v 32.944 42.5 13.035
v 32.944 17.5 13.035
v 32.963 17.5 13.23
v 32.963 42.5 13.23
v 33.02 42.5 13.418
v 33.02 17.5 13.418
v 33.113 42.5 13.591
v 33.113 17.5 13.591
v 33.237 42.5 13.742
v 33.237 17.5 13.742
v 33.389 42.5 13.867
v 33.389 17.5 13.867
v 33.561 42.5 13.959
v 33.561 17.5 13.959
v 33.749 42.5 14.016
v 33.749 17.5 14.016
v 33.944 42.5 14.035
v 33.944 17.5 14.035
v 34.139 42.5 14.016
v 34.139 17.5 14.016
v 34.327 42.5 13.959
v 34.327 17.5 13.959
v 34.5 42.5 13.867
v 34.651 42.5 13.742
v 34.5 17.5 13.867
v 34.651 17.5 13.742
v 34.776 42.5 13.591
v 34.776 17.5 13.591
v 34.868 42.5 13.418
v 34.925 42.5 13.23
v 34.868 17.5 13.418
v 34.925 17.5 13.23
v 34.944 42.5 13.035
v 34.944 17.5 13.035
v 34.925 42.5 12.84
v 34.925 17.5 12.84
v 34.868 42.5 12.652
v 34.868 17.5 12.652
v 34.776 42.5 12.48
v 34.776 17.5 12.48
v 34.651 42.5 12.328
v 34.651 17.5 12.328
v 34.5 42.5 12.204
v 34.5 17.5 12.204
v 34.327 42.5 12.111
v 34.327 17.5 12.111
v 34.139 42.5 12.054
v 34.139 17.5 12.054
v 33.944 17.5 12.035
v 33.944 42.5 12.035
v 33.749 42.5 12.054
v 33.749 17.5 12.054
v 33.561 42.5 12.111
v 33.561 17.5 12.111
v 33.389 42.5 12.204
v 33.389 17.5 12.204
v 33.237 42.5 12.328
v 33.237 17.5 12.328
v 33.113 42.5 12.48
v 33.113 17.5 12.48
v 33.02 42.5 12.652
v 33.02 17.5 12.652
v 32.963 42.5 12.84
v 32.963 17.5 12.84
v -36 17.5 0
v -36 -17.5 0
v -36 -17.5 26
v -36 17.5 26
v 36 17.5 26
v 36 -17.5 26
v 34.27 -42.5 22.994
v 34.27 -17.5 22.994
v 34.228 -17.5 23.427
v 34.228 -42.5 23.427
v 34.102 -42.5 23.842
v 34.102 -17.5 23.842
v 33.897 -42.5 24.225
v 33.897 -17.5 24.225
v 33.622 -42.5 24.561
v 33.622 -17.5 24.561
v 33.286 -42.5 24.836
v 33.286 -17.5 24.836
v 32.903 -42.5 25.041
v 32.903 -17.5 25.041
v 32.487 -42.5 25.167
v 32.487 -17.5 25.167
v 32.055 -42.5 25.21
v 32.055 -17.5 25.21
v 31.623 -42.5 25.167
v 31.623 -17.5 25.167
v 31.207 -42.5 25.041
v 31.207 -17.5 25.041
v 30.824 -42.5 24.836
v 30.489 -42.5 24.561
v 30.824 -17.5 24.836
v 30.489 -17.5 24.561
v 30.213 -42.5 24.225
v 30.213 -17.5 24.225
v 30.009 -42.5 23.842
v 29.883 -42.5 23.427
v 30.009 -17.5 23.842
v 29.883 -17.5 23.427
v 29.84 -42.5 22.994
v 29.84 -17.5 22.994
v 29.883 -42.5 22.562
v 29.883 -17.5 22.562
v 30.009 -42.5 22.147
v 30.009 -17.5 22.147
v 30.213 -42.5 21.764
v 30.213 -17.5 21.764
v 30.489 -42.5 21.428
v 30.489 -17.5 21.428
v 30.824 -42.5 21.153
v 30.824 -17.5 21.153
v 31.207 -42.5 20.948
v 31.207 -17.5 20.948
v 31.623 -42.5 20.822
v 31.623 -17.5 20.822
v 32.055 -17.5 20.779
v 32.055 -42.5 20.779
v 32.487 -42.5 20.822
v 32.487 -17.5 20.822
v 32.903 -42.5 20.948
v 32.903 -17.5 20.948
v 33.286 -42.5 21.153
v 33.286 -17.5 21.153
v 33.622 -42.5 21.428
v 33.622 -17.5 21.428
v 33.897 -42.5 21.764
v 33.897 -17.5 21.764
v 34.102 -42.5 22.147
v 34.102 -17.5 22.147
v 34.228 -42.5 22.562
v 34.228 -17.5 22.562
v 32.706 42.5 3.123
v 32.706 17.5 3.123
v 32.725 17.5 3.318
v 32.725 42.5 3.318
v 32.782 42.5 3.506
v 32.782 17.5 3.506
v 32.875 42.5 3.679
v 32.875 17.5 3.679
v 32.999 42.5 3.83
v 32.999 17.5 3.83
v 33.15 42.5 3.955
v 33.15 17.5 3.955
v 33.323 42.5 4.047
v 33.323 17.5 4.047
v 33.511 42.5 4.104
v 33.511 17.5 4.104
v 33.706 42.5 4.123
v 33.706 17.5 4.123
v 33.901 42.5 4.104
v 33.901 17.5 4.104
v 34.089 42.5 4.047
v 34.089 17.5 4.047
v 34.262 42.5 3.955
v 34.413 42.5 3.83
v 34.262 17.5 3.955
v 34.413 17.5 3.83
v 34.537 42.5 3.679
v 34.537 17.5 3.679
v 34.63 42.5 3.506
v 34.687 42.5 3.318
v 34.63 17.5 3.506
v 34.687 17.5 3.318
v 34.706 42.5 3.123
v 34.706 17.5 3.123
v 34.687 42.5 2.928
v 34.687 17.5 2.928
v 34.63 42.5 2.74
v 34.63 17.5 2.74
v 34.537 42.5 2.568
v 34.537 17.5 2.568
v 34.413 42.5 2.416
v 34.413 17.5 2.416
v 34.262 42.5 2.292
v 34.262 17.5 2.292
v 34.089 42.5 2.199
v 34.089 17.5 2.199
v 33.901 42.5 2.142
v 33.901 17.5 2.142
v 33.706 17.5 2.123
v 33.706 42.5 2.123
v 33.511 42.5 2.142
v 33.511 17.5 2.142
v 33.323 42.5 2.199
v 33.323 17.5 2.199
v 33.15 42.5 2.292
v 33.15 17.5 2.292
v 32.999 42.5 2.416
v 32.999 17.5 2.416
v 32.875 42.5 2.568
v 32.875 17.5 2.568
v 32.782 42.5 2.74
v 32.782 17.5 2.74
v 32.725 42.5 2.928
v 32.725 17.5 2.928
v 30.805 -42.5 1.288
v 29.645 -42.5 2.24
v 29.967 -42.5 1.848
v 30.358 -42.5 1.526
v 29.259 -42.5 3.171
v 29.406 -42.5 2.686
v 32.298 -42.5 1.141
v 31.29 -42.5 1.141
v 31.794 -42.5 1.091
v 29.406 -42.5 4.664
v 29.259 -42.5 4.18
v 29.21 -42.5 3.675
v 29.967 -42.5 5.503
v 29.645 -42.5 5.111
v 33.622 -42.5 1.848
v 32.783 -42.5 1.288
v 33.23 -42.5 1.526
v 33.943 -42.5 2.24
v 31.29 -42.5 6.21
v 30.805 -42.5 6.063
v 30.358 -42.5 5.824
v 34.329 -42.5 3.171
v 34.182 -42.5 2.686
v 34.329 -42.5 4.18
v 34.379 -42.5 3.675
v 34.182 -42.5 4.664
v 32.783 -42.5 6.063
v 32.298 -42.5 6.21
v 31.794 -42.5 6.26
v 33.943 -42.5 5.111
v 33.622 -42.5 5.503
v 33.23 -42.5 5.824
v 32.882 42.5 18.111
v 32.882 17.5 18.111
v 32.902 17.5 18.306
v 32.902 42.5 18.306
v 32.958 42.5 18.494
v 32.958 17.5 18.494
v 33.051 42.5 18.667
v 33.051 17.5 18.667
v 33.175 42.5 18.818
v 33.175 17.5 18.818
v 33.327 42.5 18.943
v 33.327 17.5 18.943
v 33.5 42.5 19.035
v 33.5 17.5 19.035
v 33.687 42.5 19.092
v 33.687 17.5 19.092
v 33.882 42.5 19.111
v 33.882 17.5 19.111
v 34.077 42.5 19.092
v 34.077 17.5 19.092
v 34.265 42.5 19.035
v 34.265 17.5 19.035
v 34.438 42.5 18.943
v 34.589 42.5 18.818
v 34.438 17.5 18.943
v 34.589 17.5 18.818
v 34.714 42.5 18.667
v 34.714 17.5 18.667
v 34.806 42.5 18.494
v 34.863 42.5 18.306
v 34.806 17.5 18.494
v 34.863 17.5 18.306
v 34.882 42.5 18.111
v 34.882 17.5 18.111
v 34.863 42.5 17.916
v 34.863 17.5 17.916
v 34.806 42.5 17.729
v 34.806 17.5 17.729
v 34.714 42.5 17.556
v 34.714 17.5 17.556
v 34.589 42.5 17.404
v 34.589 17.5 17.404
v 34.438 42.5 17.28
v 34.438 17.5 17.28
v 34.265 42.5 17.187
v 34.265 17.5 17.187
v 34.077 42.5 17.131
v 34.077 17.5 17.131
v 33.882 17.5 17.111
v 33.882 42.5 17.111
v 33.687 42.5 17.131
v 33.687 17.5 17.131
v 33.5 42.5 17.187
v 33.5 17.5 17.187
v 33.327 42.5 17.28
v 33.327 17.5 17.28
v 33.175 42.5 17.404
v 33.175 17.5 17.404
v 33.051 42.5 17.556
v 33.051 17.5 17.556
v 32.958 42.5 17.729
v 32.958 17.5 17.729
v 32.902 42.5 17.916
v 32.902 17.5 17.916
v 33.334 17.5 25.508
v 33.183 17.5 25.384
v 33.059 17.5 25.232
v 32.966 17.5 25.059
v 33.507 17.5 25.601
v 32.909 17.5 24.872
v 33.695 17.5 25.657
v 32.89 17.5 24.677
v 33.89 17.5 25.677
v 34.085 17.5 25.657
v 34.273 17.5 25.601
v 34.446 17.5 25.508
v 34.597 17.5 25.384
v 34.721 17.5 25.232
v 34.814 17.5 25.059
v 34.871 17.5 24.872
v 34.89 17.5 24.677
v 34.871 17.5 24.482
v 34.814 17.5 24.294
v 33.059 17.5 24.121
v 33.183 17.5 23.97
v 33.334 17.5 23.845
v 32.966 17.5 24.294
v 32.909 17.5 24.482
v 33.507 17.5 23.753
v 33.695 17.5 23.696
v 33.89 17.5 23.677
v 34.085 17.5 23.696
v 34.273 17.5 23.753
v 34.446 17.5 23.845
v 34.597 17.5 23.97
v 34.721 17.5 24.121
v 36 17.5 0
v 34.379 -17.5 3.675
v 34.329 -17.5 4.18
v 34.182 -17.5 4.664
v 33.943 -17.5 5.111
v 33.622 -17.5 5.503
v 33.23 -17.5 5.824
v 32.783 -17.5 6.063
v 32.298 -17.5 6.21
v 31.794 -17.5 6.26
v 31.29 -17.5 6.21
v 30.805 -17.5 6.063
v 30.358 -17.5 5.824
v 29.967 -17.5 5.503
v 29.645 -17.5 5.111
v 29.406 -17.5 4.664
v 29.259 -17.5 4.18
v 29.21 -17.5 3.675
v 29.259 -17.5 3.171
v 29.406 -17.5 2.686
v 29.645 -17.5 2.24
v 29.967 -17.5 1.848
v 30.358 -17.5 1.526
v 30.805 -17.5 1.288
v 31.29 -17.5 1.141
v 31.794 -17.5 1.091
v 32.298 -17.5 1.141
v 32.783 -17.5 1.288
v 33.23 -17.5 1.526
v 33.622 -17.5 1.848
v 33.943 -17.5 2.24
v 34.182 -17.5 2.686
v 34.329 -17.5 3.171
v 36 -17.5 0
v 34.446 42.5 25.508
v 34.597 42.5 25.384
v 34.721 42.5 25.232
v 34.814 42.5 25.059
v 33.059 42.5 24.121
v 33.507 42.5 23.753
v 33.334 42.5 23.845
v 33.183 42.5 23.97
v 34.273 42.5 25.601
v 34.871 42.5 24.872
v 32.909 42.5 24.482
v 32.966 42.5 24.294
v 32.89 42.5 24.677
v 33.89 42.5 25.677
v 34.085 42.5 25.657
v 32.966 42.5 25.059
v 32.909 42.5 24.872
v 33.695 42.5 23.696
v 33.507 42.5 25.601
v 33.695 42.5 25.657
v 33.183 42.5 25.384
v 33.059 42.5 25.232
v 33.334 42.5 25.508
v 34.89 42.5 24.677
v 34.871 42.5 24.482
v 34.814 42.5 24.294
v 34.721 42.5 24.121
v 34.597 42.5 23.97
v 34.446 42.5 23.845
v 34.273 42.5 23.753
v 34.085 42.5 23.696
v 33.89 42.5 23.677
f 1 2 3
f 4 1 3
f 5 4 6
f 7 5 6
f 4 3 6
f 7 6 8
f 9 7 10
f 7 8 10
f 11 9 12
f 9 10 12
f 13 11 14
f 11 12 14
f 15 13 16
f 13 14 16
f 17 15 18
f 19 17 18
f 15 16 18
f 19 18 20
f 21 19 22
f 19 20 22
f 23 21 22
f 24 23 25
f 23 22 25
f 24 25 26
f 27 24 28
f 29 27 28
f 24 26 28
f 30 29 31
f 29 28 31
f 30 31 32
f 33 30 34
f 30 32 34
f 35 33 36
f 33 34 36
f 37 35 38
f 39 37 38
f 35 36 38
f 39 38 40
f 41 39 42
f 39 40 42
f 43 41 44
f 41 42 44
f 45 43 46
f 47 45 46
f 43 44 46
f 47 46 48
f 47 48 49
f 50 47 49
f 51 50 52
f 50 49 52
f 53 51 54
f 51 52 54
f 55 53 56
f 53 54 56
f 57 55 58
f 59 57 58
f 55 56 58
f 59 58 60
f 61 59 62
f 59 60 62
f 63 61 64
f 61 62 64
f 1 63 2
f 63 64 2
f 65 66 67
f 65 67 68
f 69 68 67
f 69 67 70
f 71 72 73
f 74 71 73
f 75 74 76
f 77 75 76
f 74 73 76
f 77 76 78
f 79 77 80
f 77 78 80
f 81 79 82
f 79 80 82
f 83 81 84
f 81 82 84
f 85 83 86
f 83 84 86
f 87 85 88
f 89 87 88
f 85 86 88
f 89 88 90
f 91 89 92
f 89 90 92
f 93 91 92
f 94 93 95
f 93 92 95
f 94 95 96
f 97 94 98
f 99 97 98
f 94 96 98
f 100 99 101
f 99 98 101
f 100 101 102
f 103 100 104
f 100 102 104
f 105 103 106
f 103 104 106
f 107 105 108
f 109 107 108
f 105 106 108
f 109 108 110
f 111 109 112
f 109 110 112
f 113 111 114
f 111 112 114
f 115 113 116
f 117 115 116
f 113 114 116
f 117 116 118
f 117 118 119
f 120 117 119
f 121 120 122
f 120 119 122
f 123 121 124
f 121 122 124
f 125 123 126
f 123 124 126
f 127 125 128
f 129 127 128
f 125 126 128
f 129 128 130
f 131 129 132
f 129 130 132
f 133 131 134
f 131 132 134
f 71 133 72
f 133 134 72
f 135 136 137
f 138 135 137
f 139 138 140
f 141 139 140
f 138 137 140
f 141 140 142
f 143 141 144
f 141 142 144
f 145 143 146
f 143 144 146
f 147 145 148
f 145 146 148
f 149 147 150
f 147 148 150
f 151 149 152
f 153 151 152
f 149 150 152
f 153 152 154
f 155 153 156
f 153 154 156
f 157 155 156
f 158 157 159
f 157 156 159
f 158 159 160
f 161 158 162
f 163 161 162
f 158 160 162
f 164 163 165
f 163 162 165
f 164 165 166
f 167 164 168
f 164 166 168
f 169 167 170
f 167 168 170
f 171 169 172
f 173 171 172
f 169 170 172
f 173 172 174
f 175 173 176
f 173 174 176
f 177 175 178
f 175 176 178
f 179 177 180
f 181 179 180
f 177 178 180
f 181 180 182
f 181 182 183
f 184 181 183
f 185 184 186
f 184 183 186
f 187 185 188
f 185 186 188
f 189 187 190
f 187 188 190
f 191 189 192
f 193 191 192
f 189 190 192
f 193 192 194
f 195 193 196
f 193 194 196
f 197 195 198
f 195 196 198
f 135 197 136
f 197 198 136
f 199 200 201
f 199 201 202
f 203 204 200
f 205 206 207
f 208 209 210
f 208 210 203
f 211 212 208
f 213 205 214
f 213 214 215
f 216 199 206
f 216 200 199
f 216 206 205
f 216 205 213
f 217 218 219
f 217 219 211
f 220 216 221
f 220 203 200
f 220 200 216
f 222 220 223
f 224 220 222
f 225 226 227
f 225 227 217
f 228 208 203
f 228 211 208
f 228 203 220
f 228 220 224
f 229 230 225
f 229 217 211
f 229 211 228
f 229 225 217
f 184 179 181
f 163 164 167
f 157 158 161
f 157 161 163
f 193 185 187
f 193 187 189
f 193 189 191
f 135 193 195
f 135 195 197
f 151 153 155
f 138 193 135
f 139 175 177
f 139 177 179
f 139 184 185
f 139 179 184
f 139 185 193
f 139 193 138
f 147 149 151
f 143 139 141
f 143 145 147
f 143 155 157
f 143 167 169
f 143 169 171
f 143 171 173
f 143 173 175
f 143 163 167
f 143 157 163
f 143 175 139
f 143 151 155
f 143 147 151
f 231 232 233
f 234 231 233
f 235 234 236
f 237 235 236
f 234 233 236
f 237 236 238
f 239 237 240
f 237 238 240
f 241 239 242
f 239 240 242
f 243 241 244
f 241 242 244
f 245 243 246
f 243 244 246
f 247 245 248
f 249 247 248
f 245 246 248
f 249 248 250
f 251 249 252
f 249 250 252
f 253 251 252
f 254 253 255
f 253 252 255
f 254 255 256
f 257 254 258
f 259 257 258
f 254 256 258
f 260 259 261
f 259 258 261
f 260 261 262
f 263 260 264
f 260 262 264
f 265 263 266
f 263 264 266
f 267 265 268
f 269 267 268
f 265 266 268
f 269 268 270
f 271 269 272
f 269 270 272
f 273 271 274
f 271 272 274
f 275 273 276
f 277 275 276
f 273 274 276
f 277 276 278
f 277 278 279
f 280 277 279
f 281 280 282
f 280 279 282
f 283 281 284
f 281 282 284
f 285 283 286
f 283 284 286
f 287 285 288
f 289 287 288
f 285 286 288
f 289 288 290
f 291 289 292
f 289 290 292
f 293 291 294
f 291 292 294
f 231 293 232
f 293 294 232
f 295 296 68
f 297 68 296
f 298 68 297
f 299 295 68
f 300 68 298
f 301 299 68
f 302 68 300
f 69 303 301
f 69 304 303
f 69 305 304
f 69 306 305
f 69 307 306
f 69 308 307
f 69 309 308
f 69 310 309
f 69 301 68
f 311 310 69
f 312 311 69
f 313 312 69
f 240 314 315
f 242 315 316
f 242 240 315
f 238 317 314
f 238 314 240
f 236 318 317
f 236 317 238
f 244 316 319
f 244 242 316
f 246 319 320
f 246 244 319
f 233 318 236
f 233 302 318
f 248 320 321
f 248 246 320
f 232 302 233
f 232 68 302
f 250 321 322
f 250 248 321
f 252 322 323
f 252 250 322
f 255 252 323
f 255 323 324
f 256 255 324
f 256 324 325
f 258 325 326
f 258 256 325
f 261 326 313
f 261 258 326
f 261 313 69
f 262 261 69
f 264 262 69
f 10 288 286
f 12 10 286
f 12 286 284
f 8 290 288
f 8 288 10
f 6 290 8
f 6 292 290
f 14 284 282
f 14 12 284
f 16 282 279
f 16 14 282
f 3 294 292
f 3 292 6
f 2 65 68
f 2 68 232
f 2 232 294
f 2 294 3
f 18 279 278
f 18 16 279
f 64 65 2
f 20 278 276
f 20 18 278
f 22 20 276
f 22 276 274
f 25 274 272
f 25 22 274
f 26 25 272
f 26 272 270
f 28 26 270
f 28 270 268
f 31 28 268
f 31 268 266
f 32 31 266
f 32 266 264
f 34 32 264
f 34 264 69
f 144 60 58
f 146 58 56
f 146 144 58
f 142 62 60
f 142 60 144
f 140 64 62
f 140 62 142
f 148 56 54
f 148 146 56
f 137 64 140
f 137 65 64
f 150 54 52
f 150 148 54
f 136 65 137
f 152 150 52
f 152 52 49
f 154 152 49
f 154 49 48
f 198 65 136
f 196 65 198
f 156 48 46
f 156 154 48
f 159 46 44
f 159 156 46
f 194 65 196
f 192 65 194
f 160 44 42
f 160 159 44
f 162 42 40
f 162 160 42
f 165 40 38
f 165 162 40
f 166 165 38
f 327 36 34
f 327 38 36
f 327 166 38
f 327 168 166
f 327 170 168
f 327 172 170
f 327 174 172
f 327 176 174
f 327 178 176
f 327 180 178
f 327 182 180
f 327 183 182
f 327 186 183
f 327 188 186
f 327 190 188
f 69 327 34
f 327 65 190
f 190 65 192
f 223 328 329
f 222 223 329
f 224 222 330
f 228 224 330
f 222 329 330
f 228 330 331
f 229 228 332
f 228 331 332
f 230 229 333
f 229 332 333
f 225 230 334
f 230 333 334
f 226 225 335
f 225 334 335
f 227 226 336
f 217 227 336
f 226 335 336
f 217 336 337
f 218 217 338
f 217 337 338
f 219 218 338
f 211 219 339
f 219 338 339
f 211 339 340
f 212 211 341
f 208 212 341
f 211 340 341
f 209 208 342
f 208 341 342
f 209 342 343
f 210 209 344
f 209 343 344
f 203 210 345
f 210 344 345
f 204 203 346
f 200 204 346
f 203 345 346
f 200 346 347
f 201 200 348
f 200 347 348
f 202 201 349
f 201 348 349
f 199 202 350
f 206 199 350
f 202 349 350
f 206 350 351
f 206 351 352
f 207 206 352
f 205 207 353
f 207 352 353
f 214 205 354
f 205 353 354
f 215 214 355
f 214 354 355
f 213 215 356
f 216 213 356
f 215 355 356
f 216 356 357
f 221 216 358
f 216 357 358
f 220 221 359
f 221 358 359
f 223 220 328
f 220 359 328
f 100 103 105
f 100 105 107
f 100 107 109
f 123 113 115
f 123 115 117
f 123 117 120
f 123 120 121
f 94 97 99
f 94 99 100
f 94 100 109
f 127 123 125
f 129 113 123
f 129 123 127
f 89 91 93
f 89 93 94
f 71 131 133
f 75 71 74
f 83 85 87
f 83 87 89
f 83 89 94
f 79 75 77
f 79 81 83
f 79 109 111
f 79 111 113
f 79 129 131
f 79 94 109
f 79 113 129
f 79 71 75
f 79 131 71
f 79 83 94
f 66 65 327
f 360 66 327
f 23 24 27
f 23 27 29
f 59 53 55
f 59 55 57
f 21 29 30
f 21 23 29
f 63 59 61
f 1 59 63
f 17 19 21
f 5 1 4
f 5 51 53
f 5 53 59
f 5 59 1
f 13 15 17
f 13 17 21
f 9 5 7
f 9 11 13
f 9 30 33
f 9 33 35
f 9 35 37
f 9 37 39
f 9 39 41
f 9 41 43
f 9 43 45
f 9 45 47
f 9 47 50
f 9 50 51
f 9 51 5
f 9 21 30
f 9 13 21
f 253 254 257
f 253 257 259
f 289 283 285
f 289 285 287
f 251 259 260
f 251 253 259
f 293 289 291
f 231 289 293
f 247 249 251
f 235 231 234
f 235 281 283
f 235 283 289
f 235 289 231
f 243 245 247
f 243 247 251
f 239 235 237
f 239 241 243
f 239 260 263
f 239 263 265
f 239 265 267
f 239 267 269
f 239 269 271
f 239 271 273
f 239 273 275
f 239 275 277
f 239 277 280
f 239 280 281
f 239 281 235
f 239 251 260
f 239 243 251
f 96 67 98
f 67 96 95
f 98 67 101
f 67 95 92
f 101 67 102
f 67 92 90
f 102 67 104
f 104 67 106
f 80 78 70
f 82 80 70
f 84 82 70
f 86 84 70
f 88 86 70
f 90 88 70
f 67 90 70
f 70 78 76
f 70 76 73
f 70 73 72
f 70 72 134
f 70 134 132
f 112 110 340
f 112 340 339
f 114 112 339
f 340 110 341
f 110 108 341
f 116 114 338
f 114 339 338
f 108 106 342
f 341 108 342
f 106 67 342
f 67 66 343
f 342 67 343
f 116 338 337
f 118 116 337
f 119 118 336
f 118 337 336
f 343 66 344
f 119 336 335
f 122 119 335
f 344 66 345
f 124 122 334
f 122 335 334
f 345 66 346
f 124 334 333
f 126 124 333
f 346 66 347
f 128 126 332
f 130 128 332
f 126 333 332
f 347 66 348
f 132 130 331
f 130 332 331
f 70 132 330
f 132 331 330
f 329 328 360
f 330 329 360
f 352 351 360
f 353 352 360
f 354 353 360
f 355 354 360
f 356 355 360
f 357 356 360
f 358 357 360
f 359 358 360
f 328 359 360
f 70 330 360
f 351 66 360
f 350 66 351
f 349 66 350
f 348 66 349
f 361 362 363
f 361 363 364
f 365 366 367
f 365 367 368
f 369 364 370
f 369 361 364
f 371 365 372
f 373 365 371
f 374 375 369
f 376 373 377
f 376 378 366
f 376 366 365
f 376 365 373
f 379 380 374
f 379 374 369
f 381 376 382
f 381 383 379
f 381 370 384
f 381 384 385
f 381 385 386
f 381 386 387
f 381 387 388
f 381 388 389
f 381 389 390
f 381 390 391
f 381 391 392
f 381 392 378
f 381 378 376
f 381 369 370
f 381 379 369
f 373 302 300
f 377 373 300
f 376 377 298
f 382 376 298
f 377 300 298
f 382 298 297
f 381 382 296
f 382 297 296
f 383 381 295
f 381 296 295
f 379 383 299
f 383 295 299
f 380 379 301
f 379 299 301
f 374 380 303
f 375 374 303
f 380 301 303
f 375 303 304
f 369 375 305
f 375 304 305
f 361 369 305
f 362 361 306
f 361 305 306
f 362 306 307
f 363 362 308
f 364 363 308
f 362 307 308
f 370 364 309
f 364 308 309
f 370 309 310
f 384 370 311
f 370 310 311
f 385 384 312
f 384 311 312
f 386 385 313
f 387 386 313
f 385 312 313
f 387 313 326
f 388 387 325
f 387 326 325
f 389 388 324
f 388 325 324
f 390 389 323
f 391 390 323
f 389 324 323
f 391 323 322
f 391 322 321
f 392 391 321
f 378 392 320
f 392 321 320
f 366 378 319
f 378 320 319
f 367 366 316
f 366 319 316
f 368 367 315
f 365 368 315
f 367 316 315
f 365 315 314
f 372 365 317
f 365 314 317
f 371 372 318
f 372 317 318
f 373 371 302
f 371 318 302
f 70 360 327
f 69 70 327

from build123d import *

# Parameters (mm, degrees)
F0_W     = 72
F0_H     = 35
F1_DEPTH = 26
F2_R     = 2.215241
F2_R_2   = 2.584448
F3_DEPTH = 25
F4_R     = 1
F5_DEPTH = 25


with BuildPart() as f1:
    # F0 (on Top) → F1 (new body)
    with BuildSketch(Plane.XY):
        Rectangle(F0_W, F0_H)
    extrude(amount=F1_DEPTH)

    # F2 (on face) → F3 (join)
    with BuildSketch(Plane.XZ.offset(17.5)):
        with Locations((32.055214, 22.994446)):
            Circle(F2_R)
        with Locations((31.794146, 3.67538)):
            Circle(F2_R_2)
    extrude(amount=F3_DEPTH)

    # F4 (on face) → F5 (join)
    with BuildSketch(Plane(origin=(0, 17.5, 0), x_dir=(-1, 0, 0), z_dir=(0, 1, 0))):
        with Locations((-33.889978, 24.676624)):
            Circle(F4_R)
        with Locations((-33.882375, 18.111377)):
            Circle(F4_R)
        with Locations((-33.944174, 13.035096)):
            Circle(F4_R)
        with Locations((-33.705986, 3.123124)):
            Circle(F4_R)
    extrude(amount=F5_DEPTH)


solid = f1.part
